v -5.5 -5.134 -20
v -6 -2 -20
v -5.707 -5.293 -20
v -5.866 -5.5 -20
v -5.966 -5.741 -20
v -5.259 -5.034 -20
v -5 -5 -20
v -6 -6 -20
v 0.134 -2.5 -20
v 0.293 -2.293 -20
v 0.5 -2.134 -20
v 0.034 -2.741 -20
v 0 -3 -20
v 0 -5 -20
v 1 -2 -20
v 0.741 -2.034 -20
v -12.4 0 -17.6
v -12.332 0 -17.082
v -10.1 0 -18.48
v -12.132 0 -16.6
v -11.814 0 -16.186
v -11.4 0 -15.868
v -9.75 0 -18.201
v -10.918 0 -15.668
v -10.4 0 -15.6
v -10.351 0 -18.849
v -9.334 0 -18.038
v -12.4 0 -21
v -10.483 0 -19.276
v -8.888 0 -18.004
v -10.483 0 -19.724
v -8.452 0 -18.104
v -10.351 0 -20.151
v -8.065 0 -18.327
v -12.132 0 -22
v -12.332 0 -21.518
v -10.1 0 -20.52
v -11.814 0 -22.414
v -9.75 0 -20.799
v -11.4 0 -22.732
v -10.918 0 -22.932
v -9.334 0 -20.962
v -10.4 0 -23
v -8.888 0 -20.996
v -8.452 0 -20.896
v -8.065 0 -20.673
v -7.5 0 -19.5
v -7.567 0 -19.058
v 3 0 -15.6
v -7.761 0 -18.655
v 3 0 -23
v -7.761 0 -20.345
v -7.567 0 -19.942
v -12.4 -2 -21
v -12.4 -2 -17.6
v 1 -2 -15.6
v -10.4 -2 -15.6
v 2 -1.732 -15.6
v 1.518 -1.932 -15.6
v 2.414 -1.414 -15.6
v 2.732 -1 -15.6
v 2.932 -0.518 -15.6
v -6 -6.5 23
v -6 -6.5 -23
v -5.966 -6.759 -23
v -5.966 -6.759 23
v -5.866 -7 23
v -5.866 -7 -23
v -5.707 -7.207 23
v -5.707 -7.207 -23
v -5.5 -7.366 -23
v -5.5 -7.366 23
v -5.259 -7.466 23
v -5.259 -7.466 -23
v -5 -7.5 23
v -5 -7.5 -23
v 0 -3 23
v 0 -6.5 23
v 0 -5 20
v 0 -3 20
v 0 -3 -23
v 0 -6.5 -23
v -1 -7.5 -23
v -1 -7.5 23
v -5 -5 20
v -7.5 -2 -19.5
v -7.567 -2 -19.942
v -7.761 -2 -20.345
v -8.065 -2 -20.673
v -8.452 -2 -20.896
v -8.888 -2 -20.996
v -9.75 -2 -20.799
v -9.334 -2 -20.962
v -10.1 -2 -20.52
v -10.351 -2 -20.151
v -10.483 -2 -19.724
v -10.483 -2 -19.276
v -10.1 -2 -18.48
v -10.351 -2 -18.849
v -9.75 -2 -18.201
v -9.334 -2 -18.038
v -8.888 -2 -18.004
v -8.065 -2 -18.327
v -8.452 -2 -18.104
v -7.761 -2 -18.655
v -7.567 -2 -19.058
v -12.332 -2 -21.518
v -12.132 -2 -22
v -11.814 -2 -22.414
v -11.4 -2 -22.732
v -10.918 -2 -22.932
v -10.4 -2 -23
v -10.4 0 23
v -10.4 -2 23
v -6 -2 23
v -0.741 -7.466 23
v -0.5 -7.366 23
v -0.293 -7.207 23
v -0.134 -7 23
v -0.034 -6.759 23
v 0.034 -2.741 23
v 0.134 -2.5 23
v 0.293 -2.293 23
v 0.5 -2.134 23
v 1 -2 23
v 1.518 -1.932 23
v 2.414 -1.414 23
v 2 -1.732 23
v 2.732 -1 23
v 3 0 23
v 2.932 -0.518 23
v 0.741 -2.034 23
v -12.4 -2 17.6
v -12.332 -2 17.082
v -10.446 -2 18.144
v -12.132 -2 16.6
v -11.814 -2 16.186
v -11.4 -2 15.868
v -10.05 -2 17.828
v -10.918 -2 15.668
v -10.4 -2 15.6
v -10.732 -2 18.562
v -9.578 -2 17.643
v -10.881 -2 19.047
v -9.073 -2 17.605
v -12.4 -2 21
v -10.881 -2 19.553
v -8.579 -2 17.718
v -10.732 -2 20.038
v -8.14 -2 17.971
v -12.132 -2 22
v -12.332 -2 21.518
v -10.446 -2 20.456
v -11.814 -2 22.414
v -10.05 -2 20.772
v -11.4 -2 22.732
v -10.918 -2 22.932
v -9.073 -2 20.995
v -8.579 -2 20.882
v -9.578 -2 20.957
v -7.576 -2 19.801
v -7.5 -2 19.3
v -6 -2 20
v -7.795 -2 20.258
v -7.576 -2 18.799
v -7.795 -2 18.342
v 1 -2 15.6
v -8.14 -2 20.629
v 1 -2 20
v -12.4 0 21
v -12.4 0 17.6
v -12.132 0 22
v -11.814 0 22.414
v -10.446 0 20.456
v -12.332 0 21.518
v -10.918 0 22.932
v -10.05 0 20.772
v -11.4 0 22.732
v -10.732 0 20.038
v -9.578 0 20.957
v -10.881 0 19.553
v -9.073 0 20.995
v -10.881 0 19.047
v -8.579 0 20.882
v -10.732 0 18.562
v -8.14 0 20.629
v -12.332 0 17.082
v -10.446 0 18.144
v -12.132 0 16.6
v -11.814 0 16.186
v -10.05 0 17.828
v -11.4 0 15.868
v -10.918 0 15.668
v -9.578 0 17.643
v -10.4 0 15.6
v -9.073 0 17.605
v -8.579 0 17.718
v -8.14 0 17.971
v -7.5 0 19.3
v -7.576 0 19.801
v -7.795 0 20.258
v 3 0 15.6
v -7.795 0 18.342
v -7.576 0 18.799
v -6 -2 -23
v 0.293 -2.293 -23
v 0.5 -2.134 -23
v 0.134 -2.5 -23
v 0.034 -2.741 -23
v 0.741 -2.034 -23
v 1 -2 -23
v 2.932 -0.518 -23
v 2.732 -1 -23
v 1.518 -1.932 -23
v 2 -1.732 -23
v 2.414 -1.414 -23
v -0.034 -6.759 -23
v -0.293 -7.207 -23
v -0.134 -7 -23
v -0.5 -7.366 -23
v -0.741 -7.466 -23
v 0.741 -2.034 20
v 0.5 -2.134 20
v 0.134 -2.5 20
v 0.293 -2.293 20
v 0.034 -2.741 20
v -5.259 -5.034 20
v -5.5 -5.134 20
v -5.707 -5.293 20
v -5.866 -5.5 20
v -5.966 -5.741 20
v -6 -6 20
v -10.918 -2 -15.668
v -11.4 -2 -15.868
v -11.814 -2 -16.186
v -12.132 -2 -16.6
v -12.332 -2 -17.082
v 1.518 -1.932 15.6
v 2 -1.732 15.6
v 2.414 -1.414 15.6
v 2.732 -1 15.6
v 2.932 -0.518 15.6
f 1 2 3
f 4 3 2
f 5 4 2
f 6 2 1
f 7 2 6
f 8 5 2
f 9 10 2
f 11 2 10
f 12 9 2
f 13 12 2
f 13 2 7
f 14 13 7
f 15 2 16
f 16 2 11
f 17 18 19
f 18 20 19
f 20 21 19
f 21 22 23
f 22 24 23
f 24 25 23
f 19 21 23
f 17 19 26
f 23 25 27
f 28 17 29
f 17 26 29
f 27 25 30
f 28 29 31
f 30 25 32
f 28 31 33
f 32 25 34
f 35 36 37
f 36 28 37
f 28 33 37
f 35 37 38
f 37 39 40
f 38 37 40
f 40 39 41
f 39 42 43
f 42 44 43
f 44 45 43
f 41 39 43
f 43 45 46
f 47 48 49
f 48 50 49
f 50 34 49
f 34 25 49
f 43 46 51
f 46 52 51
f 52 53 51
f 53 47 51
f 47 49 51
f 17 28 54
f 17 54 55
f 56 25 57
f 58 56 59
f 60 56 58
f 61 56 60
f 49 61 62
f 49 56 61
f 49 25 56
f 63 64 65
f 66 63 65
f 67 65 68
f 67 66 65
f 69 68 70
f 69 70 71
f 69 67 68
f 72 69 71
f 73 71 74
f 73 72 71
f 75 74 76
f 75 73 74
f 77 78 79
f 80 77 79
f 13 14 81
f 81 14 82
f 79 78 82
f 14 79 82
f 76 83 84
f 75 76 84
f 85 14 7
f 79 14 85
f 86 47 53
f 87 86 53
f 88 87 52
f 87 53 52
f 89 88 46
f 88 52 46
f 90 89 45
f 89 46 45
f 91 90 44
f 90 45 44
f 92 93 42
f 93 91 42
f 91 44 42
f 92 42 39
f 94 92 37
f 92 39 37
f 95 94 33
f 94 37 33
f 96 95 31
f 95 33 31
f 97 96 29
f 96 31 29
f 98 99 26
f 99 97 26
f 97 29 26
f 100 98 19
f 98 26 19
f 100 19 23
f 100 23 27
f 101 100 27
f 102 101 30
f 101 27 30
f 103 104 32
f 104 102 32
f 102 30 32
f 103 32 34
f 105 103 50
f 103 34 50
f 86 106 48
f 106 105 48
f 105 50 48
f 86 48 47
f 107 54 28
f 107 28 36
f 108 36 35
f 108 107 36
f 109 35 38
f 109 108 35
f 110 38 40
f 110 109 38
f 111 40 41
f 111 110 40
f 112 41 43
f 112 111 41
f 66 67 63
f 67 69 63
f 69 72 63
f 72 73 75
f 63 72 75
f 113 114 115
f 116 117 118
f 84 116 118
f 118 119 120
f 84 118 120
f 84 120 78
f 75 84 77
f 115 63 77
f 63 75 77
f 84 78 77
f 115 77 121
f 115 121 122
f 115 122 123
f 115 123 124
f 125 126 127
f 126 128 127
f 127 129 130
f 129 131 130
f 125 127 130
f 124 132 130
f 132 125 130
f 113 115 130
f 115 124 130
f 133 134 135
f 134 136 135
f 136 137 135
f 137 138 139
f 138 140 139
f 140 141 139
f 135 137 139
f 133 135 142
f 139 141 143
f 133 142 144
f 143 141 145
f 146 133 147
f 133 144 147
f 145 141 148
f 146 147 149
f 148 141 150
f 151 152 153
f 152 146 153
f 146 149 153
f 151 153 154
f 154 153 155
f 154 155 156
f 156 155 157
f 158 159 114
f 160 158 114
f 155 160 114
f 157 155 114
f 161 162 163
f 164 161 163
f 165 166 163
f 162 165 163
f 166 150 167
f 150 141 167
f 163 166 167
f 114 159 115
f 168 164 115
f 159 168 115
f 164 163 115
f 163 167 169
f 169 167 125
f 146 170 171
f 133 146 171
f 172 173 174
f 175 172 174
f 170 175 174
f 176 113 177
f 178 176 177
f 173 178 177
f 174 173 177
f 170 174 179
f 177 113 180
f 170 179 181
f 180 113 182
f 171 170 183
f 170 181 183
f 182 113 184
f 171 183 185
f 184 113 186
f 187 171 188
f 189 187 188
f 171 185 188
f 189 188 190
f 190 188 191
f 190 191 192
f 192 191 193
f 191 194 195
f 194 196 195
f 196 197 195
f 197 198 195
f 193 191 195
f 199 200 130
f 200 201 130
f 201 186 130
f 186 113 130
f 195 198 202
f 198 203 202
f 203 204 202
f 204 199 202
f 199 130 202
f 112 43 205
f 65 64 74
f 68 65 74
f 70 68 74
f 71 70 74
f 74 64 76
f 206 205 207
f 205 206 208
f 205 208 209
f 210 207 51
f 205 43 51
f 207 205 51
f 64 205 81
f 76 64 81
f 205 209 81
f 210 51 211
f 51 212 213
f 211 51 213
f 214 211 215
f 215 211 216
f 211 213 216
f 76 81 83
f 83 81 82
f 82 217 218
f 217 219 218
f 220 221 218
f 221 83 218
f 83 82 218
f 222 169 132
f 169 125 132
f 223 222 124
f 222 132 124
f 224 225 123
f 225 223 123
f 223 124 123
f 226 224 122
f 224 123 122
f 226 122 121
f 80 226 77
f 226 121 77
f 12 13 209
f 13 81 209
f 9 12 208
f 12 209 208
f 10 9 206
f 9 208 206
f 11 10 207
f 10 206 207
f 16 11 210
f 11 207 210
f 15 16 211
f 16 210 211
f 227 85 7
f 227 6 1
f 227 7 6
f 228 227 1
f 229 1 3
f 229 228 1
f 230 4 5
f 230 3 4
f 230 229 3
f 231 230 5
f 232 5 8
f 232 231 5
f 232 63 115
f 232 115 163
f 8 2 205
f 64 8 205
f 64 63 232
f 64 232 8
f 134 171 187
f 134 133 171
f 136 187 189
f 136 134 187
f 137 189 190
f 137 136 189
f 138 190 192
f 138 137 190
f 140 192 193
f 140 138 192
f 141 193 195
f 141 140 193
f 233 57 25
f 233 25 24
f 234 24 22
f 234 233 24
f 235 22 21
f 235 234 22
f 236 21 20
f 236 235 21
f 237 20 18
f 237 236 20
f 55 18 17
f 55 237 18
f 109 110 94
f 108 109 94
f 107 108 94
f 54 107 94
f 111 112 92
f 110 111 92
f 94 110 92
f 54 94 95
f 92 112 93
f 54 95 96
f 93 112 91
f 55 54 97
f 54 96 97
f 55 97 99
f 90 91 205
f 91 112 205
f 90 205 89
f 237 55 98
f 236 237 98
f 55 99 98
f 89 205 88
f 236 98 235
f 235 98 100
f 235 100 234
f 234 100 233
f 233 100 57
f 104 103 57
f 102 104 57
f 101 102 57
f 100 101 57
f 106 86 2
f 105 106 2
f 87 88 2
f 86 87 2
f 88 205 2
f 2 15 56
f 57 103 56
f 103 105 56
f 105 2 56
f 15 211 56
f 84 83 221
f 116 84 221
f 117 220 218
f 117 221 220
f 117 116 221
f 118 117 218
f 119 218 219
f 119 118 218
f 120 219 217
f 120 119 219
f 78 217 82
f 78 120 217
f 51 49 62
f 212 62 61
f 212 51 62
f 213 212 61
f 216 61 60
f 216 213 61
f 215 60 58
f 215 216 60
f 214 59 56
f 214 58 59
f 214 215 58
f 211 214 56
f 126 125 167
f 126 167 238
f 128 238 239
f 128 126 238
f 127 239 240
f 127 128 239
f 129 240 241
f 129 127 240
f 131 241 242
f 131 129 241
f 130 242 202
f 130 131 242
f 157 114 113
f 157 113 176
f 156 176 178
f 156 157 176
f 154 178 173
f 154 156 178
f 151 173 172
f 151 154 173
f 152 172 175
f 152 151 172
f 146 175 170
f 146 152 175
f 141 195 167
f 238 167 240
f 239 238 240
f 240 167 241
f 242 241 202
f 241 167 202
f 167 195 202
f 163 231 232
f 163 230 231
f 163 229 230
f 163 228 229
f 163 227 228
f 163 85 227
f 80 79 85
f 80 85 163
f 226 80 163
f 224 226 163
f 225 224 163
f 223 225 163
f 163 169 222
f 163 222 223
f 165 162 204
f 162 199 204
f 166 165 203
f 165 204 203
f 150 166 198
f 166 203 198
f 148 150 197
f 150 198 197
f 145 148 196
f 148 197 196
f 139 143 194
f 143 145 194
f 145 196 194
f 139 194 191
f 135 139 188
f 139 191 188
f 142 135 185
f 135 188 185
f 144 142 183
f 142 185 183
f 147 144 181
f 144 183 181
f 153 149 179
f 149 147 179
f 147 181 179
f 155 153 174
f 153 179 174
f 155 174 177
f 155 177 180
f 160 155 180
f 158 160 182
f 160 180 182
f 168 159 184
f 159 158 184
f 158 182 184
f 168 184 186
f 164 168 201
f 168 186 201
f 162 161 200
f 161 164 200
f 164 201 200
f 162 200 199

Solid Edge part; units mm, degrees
sketch "Sketch1" plane through (0, 0, 0) normal (1, 0, 0) x (0, 1, 0)
  line L0 (-5, 20) -> (-2, 20)
  line L1 (-2, 20) -> (-2, -20)
  line L2 (-2, -20) -> (-5, -20)
  line L3 (-5, -20) -> (-5, 20)
  line L4 (-7.5, 23) -> (0, 23)
  line L5 (0, 23) -> (0, -23)
  line L6 (0, -23) -> (-7.5, -23)
  line L7 (-7.5, -23) -> (-7.5, 23)
  dimension "D1" = 2
  dimension "D2" = 3
  dimension "D3" = 3
  dimension "D4" = 40
  dimension "D5" = 2.5
extrude "Protrusion1" add sketch "Sketch1" against normal blind 6
sketch "Sketch2" plane through (0, 0, 0) normal (0, -1, 0) x (1, 0, 0)
  line L0 (-12.4, 15.6) -> (3, 15.6)
  line L1 (3, 15.6) -> (3, 23)
  line L2 (3, 23) -> (-12.4, 23)
  line L3 (-12.4, 23) -> (-12.4, 15.6)
  circle A0 centre (-9.2, 19.3) radius 1.7
  line L4 (3, -23) -> (-12.4, -23)
  line L5 (-12.4, -23) -> (-12.4, -15.6)
  line L6 (-12.4, -15.6) -> (3, -15.6)
  line L7 (3, -15.6) -> (3, -23)
  circle A1 centre (-9, -19.5) radius 1.5
  dimension "D1" = 3.4
  dimension "D2" = 1.5
  dimension "D3" = 1.5
  dimension "D4" = 2
  dimension "D5" = 3
extrude "Protrusion2" add sketch "Sketch2" along normal up to surface (2 mm away)
fillet "Round_1" radius 1 6 edges at (-6, -5, 0) (-6, -7.5, 0) (0, -7.5, 0) (0, -2, 0) (0, -2, 21.5) (0, -2, -21.5)
fillet "Round_2" radius 2 6 edges at (-12.4, -1, 23) (-12.4, -1, 15.6) (-12.4, -1, -15.6) (-12.4, -1, -23) (3, -2, 19.3) (3, -2, -19.3)
sketch "Sketch3" plane through (0, 0, 0) normal (0, -1, 0) x (1, 0, 0)
  line L0 (-20.672, -15.6) -> (-20.672, 15.6)
  line L1 (-20.672, 15.6) -> (17.3564, 15.6)
  line L2 (17.3564, 15.6) -> (17.3564, -15.6)
  line L3 (17.3564, -15.6) -> (-20.672, -15.6)
extrude "Cutout1" cut sketch "Sketch3" along normal up to next
